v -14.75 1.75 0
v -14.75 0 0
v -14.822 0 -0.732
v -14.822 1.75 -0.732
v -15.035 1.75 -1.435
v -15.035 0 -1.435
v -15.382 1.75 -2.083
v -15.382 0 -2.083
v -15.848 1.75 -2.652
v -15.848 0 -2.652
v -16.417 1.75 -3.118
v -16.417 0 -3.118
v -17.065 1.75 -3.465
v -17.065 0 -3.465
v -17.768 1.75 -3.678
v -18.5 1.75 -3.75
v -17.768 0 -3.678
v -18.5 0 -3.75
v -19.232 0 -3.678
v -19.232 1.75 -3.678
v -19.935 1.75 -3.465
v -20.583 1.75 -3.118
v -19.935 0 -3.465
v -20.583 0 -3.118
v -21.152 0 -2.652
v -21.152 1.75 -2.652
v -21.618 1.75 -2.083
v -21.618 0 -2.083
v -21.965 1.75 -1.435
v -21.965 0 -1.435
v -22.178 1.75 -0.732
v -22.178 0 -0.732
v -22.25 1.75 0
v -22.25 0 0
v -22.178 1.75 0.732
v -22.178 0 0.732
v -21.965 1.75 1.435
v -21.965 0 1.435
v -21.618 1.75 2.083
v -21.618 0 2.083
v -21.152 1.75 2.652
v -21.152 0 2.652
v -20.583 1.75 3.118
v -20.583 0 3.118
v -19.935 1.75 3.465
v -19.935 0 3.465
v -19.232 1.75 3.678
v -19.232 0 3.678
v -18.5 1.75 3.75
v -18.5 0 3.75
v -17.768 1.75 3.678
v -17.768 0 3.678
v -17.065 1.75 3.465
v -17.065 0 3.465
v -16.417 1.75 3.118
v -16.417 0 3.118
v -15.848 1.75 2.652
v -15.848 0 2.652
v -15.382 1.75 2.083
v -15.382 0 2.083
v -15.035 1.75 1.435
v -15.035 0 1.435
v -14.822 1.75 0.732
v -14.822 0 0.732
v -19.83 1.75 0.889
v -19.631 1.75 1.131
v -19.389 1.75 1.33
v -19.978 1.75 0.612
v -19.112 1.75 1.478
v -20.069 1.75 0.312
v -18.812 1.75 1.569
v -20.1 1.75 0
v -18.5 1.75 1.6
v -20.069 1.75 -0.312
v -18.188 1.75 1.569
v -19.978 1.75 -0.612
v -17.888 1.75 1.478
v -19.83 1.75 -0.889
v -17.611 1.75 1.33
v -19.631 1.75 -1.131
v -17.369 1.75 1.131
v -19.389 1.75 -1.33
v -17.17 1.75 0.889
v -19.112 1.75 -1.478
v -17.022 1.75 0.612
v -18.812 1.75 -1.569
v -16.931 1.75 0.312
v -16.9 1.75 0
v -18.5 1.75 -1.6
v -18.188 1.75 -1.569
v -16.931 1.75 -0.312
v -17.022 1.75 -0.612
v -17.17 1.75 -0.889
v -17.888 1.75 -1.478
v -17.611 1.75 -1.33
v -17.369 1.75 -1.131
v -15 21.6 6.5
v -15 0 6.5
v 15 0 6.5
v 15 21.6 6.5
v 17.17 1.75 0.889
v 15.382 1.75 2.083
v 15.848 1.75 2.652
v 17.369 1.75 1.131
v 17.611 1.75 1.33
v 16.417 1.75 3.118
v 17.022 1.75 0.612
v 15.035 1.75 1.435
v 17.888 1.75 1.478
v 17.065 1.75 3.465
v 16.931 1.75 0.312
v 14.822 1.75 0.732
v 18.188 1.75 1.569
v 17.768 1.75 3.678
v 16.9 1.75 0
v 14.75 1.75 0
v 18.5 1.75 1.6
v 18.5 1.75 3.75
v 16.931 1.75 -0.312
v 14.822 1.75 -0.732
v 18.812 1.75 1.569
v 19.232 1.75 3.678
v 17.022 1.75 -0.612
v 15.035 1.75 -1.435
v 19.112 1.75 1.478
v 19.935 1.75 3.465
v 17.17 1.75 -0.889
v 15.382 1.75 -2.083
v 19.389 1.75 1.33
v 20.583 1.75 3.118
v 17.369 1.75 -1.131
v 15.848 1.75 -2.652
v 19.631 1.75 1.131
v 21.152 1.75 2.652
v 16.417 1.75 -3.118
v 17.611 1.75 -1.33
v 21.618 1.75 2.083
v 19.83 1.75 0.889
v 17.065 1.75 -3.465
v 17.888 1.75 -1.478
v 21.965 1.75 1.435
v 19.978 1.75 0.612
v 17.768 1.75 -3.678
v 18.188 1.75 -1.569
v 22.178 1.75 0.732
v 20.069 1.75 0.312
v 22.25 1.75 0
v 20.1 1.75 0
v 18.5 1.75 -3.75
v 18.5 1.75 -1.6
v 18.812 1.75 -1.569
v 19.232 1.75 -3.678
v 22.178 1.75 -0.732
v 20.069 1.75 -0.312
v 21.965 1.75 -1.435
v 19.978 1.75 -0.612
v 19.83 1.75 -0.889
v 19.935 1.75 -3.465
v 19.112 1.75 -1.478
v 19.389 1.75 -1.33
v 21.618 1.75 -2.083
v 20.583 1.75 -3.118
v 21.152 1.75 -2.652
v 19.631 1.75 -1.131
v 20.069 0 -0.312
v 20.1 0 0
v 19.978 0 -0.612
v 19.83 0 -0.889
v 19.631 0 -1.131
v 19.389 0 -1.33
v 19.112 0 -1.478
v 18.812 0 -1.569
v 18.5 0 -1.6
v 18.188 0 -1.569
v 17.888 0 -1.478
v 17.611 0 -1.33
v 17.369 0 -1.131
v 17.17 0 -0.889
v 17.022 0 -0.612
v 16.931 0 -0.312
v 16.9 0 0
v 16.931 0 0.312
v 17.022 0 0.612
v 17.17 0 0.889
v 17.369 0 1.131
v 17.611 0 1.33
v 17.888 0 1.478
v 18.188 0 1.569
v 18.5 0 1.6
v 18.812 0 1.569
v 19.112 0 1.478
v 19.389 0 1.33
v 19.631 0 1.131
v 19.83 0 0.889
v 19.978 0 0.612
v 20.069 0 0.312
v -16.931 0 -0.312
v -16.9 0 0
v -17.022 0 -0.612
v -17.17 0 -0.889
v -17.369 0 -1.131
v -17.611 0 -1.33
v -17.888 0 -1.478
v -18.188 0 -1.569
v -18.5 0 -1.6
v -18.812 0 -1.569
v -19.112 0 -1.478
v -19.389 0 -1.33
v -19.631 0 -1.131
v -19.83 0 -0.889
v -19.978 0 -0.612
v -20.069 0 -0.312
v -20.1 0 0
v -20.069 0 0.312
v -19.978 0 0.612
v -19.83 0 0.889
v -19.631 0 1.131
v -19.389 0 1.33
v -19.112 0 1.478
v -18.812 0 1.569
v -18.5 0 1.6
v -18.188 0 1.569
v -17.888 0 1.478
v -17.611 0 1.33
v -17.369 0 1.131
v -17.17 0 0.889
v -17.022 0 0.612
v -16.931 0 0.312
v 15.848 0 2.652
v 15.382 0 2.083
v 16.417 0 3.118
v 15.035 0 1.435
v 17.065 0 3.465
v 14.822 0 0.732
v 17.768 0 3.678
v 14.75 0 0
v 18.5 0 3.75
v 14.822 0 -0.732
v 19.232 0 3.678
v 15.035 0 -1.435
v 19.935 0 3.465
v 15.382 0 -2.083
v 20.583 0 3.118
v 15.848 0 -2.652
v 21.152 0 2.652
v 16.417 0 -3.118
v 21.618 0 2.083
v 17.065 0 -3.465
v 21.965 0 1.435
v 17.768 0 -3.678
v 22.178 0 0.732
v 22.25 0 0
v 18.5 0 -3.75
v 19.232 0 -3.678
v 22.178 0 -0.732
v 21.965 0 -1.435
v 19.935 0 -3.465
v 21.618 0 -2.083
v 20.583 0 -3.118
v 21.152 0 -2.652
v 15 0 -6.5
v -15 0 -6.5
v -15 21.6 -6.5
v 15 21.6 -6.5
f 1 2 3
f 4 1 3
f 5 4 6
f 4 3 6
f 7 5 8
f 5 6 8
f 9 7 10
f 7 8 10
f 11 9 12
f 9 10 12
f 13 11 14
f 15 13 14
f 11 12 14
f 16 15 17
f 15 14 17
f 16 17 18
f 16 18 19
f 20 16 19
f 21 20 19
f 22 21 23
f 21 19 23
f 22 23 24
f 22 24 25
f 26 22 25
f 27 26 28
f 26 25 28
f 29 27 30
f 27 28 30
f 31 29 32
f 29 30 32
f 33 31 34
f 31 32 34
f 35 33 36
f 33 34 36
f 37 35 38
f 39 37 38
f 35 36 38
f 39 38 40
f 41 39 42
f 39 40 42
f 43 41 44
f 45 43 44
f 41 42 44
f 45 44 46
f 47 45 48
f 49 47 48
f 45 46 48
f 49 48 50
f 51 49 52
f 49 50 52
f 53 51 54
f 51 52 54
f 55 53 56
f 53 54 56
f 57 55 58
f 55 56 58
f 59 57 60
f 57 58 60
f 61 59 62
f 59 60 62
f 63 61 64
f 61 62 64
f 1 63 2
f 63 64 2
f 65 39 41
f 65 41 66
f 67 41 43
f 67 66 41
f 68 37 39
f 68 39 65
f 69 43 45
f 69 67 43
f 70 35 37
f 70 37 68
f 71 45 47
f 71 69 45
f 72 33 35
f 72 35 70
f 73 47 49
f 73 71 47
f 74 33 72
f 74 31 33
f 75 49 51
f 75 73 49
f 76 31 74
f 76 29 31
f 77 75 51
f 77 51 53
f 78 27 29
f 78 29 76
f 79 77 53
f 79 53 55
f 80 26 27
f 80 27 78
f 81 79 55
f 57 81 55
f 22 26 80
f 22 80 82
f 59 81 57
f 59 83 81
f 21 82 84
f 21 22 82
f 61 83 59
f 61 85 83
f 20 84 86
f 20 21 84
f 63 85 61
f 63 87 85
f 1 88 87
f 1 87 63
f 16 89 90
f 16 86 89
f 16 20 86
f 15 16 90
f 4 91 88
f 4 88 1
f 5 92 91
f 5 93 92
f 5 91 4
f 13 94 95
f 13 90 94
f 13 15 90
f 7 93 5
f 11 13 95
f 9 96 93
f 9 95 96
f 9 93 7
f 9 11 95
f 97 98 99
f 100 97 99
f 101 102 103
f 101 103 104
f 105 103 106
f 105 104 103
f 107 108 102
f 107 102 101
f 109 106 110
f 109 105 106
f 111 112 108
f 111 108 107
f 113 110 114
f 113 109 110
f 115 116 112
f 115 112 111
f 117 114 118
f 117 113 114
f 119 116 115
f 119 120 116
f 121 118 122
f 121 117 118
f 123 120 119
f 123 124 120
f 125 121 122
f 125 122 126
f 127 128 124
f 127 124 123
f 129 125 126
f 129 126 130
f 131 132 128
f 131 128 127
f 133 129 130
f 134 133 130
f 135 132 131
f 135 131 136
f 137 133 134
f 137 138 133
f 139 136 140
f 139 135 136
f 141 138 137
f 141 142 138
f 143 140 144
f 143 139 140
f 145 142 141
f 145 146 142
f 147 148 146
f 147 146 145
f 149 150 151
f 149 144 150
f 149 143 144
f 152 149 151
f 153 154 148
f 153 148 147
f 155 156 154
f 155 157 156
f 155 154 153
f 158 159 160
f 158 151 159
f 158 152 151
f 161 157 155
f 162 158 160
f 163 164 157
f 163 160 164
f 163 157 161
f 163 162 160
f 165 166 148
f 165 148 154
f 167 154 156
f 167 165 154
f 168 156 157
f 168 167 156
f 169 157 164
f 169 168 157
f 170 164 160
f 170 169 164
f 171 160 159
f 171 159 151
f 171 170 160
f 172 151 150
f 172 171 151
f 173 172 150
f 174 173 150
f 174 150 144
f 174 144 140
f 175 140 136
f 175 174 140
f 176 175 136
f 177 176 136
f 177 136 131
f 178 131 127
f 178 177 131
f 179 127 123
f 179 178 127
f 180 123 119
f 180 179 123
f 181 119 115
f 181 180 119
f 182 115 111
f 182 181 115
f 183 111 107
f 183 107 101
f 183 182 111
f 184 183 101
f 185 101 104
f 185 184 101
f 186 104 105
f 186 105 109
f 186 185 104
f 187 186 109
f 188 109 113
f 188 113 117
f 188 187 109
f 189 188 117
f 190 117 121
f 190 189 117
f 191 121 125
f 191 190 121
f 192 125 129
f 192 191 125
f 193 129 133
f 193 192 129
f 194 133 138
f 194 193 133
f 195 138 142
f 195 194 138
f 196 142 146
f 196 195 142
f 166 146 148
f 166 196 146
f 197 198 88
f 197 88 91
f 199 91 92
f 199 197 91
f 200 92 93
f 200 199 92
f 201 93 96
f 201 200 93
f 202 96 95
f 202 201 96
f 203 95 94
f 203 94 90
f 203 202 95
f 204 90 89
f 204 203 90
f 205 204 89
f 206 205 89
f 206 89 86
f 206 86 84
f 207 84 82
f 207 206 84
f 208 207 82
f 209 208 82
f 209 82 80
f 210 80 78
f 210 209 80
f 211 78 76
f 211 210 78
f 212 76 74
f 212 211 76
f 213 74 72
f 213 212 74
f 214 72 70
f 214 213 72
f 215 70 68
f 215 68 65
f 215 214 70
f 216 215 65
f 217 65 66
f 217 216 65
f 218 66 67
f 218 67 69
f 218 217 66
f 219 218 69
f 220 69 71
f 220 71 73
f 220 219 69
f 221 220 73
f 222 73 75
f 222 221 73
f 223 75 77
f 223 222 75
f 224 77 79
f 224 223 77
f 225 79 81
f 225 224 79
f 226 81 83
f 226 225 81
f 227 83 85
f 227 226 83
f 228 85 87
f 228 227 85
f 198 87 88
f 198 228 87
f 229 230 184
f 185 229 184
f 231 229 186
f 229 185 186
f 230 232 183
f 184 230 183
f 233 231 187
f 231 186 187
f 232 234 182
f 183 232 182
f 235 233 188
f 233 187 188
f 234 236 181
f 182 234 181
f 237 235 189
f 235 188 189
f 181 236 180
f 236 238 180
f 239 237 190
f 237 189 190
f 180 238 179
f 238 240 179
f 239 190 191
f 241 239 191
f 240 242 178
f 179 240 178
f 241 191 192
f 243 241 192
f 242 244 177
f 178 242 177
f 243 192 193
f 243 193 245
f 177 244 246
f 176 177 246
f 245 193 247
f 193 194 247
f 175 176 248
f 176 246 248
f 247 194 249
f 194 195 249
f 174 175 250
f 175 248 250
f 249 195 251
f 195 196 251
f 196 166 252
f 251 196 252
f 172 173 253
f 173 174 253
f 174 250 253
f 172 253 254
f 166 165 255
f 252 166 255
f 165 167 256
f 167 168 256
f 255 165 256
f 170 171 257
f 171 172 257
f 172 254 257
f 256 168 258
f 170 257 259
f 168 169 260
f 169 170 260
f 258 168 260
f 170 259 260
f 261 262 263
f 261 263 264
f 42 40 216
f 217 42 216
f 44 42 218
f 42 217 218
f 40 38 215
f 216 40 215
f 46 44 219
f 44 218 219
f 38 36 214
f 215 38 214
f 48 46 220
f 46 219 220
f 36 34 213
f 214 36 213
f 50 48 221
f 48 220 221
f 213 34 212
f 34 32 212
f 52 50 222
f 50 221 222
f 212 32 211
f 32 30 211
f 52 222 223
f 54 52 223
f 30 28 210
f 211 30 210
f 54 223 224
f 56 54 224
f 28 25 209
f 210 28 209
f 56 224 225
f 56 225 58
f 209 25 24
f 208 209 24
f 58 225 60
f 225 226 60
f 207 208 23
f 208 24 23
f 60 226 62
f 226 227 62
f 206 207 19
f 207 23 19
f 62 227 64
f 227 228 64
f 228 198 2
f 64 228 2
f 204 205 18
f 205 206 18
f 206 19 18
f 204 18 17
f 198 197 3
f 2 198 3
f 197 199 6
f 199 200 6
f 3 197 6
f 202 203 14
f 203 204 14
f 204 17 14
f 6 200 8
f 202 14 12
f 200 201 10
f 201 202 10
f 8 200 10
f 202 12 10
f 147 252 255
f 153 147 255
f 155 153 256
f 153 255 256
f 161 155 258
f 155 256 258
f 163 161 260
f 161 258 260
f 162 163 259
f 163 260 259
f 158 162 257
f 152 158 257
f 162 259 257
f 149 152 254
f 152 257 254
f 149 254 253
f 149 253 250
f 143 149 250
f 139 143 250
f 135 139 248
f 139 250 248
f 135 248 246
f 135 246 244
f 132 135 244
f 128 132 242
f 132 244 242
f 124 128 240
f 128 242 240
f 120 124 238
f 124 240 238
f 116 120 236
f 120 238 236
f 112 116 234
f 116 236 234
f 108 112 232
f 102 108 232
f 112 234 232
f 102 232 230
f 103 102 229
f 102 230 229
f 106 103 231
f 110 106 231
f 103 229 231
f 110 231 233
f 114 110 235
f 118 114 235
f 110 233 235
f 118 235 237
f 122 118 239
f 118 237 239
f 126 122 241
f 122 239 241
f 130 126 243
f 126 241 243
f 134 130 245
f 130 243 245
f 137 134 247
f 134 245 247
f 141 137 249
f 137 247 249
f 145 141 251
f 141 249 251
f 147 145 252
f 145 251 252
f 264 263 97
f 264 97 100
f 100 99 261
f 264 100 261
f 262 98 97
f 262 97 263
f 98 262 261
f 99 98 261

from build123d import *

# Parameters (mm, degrees)
SKETCH1_R             = 3.75
SKETCH1_R_2           = 1.6
BOSS_EXTRUDE1_DEPTH   = 1.75
BOSS_EXTRUDE1_2_DEPTH = 1.75
SKETCH2_W             = 30
SKETCH2_H             = 13
BOSS_EXTRUDE2_DEPTH   = 21.6


with BuildPart() as part:
    # Sketch1 → Boss-Extrude1 (new body)
    with BuildSketch(Plane(origin=(0, 0, 0), x_dir=(1, 0, 0), z_dir=(0, 1, 0))):
        with Locations((-18.5, 0)):
            Circle(SKETCH1_R)
        with Locations((-18.5, 0)):
            Circle(SKETCH1_R_2, mode=Mode.SUBTRACT)
    extrude(amount=BOSS_EXTRUDE1_DEPTH)


with BuildPart() as body_2:
    # Sketch1 → Boss-Extrude1 2 (new body)
    with BuildSketch(Plane(origin=(0, 0, 0), x_dir=(1, 0, 0), z_dir=(0, 1, 0))):
        with Locations((18.5, 0)):
            Circle(SKETCH1_R)
        with Locations((18.5, 0)):
            Circle(SKETCH1_R_2, mode=Mode.SUBTRACT)
    extrude(amount=BOSS_EXTRUDE1_2_DEPTH)


with BuildPart() as body_3:
    # Sketch2 → Boss-Extrude2 (new body)
    with BuildSketch(Plane(origin=(0, 0, 0), x_dir=(1, 0, 0), z_dir=(0, 1, 0))):
        Rectangle(SKETCH2_W, SKETCH2_H)
    extrude(amount=BOSS_EXTRUDE2_DEPTH)


solid = Compound([part.part, body_2.part, body_3.part])
